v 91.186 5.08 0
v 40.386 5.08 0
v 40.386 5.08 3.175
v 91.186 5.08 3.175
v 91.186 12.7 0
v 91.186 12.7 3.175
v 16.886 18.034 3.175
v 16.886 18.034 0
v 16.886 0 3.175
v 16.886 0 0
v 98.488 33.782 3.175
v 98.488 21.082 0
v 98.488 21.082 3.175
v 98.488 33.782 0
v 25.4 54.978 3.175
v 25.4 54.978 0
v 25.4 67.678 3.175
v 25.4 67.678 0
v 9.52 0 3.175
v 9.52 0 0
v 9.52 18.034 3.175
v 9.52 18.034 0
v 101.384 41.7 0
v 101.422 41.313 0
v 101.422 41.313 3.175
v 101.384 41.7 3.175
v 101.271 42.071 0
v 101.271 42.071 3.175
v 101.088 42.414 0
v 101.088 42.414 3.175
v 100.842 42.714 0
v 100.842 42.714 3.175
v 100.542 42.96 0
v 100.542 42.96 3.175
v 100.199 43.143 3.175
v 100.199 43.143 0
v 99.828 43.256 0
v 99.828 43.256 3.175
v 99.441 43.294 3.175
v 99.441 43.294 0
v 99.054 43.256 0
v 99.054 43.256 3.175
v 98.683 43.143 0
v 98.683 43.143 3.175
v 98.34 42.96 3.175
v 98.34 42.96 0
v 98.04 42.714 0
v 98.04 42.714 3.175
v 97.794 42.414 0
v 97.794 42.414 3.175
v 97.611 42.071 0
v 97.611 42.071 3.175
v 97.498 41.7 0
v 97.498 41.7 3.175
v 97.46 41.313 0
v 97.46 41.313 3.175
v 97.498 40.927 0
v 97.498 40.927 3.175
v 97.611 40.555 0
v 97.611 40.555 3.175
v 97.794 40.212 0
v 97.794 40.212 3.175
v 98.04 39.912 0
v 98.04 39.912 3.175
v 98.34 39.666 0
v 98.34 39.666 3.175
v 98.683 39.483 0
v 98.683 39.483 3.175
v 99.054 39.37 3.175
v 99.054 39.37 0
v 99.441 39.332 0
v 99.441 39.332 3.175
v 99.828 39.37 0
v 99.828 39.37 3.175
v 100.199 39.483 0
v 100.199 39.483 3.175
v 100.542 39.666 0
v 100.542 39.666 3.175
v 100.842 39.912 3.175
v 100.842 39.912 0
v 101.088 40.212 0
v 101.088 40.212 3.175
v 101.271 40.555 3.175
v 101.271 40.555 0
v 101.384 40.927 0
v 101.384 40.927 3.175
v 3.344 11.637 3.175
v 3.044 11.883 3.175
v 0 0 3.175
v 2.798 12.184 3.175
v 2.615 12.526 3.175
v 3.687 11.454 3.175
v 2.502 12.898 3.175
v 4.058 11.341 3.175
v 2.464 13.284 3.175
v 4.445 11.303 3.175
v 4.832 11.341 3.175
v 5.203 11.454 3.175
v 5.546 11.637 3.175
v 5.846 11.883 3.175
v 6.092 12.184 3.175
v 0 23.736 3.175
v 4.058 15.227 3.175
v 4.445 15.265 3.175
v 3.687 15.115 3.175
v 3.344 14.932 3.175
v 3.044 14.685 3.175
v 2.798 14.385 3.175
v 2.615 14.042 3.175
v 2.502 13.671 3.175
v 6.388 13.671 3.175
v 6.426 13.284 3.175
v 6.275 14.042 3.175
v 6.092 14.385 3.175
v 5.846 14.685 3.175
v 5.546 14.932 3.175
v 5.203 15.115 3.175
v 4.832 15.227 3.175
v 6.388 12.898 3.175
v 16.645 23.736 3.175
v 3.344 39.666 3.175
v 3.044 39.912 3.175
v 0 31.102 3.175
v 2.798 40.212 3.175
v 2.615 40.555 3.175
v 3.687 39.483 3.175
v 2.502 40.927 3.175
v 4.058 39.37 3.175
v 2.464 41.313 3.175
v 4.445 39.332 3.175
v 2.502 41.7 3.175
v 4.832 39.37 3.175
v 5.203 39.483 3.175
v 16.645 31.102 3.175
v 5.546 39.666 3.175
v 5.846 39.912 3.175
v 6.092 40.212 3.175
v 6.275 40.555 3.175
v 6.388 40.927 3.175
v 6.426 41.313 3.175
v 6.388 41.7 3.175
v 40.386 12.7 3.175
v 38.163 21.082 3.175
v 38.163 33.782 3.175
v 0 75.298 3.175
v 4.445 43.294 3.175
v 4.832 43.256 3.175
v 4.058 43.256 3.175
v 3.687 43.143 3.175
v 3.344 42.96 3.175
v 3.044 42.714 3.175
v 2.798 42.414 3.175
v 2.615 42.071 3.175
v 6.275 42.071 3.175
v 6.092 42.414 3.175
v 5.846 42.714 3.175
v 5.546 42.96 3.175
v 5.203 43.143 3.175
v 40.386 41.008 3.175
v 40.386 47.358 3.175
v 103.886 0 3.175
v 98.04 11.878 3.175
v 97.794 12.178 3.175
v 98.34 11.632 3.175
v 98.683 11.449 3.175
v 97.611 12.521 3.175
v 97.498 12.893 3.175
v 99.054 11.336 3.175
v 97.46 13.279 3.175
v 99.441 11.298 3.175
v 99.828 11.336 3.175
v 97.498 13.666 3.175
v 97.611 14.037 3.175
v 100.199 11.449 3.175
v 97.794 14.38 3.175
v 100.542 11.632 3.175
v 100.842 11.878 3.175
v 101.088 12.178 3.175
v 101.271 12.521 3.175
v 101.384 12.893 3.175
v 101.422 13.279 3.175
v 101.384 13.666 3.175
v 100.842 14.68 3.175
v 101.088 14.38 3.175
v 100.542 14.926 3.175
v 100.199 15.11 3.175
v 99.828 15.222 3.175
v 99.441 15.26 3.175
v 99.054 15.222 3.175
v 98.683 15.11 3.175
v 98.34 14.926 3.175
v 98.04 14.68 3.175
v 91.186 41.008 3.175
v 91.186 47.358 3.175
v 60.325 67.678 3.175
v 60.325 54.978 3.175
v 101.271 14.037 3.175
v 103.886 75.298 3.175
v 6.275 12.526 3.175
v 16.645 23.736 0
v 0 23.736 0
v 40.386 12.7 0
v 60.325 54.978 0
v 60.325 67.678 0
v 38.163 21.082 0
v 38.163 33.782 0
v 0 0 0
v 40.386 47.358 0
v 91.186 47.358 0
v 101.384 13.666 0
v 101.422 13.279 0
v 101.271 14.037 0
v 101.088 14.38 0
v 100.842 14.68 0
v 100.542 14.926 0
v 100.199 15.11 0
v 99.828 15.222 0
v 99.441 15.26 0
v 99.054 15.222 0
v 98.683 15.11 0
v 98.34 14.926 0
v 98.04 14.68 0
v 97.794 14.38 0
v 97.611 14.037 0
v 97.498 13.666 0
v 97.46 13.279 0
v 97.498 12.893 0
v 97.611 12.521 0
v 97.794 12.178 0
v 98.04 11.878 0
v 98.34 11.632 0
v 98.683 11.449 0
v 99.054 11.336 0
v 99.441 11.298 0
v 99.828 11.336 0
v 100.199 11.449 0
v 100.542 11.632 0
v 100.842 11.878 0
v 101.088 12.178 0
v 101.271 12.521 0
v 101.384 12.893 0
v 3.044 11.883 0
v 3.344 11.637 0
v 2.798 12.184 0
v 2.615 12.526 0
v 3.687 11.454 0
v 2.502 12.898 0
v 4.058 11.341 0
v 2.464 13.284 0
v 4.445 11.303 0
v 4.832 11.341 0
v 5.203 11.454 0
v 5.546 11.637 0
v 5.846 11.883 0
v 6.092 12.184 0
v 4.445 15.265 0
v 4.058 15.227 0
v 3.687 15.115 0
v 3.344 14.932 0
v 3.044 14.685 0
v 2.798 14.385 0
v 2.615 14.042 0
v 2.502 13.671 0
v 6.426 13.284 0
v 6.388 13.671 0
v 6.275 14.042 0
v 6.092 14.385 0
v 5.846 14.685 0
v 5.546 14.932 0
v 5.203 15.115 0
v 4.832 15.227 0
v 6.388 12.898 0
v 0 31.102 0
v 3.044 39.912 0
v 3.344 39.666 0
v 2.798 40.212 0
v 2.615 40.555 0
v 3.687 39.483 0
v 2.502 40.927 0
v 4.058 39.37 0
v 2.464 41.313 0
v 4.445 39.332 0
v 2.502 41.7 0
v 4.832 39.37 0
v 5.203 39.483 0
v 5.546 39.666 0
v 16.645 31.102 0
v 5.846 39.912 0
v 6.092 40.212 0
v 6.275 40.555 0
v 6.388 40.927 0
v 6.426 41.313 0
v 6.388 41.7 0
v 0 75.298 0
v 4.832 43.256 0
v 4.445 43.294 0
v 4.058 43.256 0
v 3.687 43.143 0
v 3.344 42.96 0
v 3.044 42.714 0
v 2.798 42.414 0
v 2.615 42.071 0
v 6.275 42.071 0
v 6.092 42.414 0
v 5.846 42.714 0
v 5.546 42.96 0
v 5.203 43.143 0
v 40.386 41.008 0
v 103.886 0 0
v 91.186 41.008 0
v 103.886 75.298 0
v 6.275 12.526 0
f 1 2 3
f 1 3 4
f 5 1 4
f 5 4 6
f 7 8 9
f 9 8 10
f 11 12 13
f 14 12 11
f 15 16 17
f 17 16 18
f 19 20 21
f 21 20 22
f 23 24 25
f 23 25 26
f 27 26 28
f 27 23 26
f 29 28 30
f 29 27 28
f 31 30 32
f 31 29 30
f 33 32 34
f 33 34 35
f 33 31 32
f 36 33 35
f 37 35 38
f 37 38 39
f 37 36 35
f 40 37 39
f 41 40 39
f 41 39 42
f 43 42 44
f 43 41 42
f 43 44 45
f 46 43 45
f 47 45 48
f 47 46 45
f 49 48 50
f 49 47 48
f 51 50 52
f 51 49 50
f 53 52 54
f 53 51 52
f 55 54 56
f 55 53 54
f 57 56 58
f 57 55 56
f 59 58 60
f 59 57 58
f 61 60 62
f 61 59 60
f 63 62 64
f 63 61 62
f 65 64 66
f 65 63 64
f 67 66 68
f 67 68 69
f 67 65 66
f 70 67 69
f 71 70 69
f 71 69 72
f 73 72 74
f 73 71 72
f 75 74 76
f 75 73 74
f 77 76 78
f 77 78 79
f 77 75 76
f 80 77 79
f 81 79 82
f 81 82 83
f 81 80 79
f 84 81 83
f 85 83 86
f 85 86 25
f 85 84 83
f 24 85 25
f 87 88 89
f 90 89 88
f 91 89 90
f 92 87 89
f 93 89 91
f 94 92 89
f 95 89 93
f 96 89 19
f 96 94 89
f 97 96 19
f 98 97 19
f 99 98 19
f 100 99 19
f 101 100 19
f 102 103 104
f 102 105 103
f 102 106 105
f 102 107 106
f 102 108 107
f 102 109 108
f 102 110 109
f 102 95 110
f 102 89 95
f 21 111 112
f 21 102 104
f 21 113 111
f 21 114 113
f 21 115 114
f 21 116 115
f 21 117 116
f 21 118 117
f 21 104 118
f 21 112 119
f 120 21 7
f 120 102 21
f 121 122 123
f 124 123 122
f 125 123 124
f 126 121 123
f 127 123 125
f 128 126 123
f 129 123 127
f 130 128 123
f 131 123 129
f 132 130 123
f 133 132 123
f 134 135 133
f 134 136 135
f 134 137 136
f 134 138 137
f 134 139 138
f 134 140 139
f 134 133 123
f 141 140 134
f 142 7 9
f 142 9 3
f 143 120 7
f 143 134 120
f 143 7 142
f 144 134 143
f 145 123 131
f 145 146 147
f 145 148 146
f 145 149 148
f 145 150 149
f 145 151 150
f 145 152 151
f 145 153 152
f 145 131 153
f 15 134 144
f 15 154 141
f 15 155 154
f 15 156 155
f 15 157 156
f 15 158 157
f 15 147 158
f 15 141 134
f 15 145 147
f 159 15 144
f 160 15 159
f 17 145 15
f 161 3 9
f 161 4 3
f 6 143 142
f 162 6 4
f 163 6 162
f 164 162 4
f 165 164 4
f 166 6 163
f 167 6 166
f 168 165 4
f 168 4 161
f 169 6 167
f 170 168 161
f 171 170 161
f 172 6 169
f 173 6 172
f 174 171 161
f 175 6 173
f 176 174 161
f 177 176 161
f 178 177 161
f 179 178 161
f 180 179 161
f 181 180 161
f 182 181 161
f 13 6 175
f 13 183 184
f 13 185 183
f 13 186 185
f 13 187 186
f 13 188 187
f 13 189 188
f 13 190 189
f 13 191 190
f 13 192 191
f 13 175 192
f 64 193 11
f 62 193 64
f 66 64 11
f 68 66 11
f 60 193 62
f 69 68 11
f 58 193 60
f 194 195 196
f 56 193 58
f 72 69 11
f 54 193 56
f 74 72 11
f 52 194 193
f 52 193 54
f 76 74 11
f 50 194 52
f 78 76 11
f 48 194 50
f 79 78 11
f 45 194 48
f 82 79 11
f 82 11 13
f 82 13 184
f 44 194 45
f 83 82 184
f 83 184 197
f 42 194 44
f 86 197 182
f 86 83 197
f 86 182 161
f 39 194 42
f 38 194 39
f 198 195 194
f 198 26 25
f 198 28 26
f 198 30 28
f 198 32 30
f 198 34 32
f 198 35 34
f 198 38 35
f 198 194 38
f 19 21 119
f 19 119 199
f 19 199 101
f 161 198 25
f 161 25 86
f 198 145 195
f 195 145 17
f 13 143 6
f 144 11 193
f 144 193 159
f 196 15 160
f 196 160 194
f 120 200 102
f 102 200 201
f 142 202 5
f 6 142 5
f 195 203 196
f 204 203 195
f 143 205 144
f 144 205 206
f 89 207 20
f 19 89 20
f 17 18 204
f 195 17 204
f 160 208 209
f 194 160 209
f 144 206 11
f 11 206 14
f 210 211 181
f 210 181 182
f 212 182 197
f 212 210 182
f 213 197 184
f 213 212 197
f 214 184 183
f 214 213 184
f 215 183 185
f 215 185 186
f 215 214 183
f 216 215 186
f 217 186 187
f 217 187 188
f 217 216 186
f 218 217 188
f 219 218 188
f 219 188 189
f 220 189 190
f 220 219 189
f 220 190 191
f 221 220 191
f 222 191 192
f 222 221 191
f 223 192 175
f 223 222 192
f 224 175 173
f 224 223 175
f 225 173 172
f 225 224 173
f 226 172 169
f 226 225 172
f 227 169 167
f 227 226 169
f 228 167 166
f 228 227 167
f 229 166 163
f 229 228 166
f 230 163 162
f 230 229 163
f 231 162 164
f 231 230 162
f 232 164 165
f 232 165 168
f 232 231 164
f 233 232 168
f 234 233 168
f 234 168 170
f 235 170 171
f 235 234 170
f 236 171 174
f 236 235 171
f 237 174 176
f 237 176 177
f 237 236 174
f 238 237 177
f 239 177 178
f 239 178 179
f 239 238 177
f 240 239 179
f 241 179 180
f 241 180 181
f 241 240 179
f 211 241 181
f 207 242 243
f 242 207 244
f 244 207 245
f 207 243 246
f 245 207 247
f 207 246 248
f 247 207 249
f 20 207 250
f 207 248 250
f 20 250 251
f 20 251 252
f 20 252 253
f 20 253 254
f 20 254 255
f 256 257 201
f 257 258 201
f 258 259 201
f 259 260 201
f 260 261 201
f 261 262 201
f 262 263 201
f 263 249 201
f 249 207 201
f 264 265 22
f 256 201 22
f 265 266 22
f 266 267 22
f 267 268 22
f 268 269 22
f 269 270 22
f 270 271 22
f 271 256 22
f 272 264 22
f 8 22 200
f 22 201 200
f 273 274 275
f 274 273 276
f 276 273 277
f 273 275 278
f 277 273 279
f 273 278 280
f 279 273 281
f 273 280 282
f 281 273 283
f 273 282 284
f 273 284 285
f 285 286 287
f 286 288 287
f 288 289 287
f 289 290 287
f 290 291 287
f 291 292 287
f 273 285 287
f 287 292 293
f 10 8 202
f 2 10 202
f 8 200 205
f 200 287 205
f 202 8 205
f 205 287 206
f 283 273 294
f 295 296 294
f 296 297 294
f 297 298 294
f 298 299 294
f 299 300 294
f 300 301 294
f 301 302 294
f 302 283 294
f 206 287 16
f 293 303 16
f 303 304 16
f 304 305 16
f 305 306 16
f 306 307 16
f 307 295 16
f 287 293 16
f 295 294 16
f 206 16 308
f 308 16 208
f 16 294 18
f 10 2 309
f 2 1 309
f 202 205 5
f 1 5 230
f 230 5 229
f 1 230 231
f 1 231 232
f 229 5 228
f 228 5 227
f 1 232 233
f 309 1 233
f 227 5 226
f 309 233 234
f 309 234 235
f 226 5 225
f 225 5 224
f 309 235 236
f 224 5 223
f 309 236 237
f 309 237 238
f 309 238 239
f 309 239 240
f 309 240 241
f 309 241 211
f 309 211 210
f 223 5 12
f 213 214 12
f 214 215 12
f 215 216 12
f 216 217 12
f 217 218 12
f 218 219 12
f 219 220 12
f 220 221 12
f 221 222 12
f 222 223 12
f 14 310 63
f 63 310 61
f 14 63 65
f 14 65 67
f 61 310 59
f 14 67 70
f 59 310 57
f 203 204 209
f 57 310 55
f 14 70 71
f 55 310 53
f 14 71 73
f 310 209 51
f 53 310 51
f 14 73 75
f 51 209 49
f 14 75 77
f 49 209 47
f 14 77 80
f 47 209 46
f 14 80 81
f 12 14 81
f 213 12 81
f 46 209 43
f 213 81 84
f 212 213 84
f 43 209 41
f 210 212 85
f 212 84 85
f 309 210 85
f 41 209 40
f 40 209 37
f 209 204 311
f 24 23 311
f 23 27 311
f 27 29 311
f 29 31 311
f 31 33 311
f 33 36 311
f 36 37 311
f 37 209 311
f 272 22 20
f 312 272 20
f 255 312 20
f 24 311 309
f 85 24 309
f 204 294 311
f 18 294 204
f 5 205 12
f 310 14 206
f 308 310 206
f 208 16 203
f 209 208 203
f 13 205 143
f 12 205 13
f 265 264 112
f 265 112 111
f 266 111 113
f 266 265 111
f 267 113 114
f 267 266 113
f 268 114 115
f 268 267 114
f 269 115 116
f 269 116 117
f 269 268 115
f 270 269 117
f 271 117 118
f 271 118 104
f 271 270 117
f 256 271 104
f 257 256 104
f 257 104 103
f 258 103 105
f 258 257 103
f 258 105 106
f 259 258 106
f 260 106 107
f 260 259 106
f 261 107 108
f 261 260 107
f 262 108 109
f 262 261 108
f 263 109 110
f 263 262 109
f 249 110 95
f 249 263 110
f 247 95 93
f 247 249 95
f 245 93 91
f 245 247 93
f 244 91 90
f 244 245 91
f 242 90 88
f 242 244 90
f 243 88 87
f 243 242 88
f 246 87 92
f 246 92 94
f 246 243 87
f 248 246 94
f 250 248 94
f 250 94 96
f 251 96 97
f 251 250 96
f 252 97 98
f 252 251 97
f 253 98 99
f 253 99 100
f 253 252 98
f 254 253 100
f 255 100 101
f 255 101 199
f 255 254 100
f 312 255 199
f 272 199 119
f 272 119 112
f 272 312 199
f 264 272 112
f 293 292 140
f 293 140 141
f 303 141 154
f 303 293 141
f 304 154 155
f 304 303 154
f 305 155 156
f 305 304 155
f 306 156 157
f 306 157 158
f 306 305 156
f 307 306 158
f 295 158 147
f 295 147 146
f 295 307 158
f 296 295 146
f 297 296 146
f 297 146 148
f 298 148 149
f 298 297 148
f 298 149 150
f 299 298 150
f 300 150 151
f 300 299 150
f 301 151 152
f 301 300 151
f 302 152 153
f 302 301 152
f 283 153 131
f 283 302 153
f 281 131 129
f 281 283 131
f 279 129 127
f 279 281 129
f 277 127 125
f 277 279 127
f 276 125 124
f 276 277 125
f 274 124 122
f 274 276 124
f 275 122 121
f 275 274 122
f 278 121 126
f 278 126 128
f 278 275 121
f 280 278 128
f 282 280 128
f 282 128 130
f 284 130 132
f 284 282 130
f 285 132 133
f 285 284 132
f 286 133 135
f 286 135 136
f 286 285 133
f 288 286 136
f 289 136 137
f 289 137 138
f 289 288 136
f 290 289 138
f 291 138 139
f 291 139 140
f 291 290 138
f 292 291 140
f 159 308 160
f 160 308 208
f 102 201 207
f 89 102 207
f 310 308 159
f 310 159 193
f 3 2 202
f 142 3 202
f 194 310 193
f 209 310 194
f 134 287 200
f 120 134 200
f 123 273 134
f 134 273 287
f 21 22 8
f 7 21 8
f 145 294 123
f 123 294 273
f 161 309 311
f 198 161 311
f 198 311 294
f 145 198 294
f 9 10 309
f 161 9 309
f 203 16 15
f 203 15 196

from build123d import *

# Parameters (mm, degrees)
F0_R     = 1.9812
F0_W     = 50.8
F0_H     = 7.62
F0_W_2   = 60.325
F0_H_2   = 12.7
F0_W_3   = 34.925
F0_H_3   = 6.35
F1_DEPTH = 3.175


with BuildPart() as f1:
    # F0 (on Top) → F1 (new body)
    with BuildSketch(Plane.XY):
        Polygon((0, 23.7363), (0, 0), (9.51992, 0), (9.51992, 18.034), (16.88592, 18.034), (16.88592, 0), (103.886, 0), (103.886, 75.2983), (0, 75.2983), (0, 31.1023), (16.64462, 31.1023), (16.64462, 23.7363), align=None)
        with Locations((4.445, 13.2842)):
            Circle(F0_R, mode=Mode.SUBTRACT)
        with Locations((65.786, 8.89)):
            Rectangle(F0_W, F0_H, mode=Mode.SUBTRACT)
        with Locations((99.441, 13.27912)):
            Circle(F0_R, mode=Mode.SUBTRACT)
        with Locations((68.326, 27.432)):
            Rectangle(F0_W_2, F0_H_2, mode=Mode.SUBTRACT)
        with Locations((4.445, 41.3131)):
            Circle(F0_R, mode=Mode.SUBTRACT)
        with Locations((42.8625, 61.3283)):
            Rectangle(F0_W_3, F0_H_2, mode=Mode.SUBTRACT)
        with Locations((65.786, 44.1833)):
            Rectangle(F0_W, F0_H_3, mode=Mode.SUBTRACT)
        with Locations((99.441, 41.3131)):
            Circle(F0_R, mode=Mode.SUBTRACT)
    extrude(amount=F1_DEPTH)


solid = f1.part
